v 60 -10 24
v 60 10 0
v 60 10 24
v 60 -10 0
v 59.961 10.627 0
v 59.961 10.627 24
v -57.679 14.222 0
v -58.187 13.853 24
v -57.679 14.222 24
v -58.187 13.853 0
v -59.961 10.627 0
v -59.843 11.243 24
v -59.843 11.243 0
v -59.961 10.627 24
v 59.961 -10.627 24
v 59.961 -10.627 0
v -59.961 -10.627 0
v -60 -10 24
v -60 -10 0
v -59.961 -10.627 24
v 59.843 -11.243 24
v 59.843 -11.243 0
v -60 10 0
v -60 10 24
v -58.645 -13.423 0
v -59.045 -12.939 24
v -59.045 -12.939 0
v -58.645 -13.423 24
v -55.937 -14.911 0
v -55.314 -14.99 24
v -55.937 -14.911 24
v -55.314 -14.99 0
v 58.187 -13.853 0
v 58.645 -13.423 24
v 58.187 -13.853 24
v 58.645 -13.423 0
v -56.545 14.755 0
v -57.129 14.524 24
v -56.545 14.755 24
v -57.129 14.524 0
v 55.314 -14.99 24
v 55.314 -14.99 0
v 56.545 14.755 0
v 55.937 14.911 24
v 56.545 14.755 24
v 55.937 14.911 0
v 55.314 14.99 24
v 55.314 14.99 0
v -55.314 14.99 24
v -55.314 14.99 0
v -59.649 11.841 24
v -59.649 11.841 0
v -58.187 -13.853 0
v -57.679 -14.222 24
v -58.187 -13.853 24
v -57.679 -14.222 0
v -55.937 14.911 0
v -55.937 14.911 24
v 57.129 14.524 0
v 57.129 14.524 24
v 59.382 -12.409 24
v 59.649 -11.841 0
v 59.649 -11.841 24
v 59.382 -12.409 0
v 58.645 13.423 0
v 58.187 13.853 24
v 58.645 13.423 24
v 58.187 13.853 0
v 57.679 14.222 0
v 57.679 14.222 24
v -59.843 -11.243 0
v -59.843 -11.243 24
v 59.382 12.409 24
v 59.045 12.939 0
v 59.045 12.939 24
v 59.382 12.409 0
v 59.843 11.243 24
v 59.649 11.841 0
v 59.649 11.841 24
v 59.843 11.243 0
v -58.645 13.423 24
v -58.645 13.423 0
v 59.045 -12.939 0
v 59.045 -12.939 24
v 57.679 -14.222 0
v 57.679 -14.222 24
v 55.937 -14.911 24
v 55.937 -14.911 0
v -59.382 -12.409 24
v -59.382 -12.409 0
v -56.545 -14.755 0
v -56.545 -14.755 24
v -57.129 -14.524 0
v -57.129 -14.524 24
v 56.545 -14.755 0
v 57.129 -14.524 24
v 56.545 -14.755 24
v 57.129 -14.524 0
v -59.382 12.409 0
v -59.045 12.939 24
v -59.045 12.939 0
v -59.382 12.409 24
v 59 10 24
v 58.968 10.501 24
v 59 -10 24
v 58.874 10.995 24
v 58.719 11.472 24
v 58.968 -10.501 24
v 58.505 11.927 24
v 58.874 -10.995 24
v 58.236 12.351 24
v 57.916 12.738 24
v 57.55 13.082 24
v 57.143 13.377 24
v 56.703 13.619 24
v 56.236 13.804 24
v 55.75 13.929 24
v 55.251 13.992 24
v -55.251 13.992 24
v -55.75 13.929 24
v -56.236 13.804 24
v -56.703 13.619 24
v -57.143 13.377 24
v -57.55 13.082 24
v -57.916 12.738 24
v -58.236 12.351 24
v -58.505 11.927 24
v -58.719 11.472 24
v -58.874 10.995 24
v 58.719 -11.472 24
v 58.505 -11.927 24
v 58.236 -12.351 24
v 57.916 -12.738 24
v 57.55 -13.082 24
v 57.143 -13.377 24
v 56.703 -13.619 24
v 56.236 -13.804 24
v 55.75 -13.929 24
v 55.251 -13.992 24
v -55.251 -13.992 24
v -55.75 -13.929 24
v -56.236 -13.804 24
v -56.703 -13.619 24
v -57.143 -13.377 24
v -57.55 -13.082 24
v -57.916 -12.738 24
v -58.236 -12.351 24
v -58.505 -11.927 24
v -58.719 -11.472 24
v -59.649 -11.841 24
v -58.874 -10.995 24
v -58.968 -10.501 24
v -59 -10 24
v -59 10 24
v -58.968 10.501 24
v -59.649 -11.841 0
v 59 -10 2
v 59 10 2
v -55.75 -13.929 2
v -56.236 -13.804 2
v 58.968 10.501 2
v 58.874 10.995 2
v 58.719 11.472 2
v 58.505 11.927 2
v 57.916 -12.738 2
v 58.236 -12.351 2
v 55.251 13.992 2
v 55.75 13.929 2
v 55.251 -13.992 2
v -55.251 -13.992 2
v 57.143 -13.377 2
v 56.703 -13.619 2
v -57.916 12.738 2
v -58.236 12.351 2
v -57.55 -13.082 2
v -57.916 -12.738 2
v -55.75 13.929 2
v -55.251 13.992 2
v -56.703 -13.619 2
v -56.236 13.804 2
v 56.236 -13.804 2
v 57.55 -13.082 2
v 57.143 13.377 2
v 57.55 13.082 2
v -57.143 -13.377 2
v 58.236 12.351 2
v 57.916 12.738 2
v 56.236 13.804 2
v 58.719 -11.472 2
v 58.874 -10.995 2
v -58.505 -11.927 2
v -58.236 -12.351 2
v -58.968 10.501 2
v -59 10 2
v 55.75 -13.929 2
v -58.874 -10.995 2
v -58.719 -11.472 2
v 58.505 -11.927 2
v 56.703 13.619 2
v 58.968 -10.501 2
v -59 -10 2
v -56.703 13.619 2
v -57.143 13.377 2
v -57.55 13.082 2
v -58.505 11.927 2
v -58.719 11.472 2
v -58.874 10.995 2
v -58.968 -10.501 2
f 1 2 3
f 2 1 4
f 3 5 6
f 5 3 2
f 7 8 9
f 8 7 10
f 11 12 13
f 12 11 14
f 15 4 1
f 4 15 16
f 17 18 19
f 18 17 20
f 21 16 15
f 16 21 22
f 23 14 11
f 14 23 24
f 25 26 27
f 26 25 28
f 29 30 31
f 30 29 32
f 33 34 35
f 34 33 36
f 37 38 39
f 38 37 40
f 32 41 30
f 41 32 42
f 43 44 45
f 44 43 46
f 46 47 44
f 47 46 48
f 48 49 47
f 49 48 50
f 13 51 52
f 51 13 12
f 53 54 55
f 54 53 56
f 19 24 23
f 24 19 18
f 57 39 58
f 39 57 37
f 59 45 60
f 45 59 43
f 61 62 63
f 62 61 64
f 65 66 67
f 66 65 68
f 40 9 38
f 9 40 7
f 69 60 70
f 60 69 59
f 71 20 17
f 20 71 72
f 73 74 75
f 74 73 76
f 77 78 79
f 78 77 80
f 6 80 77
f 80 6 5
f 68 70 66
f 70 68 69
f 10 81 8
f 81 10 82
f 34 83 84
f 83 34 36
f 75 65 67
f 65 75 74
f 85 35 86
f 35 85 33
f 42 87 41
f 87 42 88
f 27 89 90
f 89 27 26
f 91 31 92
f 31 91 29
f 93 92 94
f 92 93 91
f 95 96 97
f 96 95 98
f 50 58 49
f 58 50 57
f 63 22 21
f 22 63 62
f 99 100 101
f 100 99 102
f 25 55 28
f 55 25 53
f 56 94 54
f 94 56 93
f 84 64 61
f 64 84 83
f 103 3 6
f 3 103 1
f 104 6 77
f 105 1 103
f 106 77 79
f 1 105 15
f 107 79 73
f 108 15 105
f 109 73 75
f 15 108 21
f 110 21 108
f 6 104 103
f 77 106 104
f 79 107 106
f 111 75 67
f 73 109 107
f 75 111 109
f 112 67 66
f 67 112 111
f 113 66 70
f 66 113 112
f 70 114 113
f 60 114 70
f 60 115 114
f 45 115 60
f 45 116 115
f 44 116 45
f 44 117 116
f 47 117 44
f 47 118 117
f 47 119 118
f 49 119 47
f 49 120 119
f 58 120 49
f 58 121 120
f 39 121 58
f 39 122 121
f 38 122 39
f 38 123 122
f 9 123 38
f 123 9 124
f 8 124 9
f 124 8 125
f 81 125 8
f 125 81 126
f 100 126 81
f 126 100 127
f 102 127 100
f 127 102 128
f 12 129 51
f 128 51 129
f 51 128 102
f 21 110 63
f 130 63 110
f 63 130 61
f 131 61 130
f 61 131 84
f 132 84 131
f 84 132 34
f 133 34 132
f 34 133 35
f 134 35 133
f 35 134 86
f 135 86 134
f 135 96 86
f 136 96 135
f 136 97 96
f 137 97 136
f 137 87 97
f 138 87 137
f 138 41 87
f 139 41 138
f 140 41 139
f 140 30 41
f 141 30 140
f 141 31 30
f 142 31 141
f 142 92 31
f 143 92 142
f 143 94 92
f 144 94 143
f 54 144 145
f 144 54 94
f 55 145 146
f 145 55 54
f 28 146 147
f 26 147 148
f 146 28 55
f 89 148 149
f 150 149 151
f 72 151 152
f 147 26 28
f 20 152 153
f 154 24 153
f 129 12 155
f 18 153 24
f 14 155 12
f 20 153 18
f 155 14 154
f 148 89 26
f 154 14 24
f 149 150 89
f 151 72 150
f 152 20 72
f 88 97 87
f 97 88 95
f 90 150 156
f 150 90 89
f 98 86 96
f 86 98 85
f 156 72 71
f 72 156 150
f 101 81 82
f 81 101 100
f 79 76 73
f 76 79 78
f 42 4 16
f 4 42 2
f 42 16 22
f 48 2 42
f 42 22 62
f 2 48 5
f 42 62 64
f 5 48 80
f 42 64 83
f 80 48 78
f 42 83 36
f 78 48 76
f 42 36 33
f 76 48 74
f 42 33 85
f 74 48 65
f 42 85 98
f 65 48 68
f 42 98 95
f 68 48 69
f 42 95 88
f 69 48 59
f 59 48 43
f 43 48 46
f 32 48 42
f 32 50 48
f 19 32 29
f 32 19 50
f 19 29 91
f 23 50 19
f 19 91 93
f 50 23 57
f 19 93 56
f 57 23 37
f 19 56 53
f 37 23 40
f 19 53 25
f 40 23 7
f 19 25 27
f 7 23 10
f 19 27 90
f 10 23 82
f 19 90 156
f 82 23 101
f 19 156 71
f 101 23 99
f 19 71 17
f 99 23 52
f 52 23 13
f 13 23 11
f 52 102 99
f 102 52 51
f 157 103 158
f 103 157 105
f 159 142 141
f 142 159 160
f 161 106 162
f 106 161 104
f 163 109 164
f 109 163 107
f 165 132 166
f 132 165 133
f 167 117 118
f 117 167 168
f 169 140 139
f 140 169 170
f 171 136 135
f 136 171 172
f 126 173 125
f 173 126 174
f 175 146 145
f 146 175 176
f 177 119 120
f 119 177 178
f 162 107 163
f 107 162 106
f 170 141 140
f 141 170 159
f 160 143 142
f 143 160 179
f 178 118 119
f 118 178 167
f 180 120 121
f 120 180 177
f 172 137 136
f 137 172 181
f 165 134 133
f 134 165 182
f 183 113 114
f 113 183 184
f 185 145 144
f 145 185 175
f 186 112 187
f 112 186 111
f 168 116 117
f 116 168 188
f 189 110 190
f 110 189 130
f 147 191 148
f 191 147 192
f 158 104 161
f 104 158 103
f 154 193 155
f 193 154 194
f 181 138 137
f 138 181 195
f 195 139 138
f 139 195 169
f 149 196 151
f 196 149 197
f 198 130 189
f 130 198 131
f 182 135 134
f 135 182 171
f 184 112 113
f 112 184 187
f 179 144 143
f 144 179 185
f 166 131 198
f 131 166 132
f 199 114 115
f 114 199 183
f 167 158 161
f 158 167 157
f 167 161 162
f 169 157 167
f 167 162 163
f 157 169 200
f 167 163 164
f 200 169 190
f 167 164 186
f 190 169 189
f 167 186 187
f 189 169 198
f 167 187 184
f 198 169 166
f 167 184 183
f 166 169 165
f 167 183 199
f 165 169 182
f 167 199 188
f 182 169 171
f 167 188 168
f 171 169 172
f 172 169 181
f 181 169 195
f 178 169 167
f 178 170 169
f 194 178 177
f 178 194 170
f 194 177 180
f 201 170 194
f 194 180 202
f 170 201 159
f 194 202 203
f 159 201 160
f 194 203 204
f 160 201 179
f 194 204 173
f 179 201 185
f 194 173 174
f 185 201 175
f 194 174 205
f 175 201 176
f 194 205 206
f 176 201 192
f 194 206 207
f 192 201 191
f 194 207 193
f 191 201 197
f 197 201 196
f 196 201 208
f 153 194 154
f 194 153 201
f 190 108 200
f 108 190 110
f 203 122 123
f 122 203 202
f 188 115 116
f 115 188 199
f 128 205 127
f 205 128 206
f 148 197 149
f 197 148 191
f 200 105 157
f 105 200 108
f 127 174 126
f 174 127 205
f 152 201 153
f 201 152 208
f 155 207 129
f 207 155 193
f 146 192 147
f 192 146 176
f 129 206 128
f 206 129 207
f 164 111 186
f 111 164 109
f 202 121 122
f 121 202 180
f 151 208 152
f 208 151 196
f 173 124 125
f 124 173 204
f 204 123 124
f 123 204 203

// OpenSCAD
$fn = 50;


difference() {
	union() {
		hull() {
			translate(v = [-55.0000000000, 10.0000000000, 0]) {
				cylinder(h = 24, r = 5);
			}
			translate(v = [55.0000000000, 10.0000000000, 0]) {
				cylinder(h = 24, r = 5);
			}
			translate(v = [-55.0000000000, -10.0000000000, 0]) {
				cylinder(h = 24, r = 5);
			}
			translate(v = [55.0000000000, -10.0000000000, 0]) {
				cylinder(h = 24, r = 5);
			}
		}
	}
	union() {
		translate(v = [0, 0, 2]) {
			hull() {
				translate(v = [-55.0000000000, 10.0000000000, 0]) {
					cylinder(h = 22, r = 4);
				}
				translate(v = [55.0000000000, 10.0000000000, 0]) {
					cylinder(h = 22, r = 4);
				}
				translate(v = [-55.0000000000, -10.0000000000, 0]) {
					cylinder(h = 22, r = 4);
				}
				translate(v = [55.0000000000, -10.0000000000, 0]) {
					cylinder(h = 22, r = 4);
				}
			}
		}
	}
}
